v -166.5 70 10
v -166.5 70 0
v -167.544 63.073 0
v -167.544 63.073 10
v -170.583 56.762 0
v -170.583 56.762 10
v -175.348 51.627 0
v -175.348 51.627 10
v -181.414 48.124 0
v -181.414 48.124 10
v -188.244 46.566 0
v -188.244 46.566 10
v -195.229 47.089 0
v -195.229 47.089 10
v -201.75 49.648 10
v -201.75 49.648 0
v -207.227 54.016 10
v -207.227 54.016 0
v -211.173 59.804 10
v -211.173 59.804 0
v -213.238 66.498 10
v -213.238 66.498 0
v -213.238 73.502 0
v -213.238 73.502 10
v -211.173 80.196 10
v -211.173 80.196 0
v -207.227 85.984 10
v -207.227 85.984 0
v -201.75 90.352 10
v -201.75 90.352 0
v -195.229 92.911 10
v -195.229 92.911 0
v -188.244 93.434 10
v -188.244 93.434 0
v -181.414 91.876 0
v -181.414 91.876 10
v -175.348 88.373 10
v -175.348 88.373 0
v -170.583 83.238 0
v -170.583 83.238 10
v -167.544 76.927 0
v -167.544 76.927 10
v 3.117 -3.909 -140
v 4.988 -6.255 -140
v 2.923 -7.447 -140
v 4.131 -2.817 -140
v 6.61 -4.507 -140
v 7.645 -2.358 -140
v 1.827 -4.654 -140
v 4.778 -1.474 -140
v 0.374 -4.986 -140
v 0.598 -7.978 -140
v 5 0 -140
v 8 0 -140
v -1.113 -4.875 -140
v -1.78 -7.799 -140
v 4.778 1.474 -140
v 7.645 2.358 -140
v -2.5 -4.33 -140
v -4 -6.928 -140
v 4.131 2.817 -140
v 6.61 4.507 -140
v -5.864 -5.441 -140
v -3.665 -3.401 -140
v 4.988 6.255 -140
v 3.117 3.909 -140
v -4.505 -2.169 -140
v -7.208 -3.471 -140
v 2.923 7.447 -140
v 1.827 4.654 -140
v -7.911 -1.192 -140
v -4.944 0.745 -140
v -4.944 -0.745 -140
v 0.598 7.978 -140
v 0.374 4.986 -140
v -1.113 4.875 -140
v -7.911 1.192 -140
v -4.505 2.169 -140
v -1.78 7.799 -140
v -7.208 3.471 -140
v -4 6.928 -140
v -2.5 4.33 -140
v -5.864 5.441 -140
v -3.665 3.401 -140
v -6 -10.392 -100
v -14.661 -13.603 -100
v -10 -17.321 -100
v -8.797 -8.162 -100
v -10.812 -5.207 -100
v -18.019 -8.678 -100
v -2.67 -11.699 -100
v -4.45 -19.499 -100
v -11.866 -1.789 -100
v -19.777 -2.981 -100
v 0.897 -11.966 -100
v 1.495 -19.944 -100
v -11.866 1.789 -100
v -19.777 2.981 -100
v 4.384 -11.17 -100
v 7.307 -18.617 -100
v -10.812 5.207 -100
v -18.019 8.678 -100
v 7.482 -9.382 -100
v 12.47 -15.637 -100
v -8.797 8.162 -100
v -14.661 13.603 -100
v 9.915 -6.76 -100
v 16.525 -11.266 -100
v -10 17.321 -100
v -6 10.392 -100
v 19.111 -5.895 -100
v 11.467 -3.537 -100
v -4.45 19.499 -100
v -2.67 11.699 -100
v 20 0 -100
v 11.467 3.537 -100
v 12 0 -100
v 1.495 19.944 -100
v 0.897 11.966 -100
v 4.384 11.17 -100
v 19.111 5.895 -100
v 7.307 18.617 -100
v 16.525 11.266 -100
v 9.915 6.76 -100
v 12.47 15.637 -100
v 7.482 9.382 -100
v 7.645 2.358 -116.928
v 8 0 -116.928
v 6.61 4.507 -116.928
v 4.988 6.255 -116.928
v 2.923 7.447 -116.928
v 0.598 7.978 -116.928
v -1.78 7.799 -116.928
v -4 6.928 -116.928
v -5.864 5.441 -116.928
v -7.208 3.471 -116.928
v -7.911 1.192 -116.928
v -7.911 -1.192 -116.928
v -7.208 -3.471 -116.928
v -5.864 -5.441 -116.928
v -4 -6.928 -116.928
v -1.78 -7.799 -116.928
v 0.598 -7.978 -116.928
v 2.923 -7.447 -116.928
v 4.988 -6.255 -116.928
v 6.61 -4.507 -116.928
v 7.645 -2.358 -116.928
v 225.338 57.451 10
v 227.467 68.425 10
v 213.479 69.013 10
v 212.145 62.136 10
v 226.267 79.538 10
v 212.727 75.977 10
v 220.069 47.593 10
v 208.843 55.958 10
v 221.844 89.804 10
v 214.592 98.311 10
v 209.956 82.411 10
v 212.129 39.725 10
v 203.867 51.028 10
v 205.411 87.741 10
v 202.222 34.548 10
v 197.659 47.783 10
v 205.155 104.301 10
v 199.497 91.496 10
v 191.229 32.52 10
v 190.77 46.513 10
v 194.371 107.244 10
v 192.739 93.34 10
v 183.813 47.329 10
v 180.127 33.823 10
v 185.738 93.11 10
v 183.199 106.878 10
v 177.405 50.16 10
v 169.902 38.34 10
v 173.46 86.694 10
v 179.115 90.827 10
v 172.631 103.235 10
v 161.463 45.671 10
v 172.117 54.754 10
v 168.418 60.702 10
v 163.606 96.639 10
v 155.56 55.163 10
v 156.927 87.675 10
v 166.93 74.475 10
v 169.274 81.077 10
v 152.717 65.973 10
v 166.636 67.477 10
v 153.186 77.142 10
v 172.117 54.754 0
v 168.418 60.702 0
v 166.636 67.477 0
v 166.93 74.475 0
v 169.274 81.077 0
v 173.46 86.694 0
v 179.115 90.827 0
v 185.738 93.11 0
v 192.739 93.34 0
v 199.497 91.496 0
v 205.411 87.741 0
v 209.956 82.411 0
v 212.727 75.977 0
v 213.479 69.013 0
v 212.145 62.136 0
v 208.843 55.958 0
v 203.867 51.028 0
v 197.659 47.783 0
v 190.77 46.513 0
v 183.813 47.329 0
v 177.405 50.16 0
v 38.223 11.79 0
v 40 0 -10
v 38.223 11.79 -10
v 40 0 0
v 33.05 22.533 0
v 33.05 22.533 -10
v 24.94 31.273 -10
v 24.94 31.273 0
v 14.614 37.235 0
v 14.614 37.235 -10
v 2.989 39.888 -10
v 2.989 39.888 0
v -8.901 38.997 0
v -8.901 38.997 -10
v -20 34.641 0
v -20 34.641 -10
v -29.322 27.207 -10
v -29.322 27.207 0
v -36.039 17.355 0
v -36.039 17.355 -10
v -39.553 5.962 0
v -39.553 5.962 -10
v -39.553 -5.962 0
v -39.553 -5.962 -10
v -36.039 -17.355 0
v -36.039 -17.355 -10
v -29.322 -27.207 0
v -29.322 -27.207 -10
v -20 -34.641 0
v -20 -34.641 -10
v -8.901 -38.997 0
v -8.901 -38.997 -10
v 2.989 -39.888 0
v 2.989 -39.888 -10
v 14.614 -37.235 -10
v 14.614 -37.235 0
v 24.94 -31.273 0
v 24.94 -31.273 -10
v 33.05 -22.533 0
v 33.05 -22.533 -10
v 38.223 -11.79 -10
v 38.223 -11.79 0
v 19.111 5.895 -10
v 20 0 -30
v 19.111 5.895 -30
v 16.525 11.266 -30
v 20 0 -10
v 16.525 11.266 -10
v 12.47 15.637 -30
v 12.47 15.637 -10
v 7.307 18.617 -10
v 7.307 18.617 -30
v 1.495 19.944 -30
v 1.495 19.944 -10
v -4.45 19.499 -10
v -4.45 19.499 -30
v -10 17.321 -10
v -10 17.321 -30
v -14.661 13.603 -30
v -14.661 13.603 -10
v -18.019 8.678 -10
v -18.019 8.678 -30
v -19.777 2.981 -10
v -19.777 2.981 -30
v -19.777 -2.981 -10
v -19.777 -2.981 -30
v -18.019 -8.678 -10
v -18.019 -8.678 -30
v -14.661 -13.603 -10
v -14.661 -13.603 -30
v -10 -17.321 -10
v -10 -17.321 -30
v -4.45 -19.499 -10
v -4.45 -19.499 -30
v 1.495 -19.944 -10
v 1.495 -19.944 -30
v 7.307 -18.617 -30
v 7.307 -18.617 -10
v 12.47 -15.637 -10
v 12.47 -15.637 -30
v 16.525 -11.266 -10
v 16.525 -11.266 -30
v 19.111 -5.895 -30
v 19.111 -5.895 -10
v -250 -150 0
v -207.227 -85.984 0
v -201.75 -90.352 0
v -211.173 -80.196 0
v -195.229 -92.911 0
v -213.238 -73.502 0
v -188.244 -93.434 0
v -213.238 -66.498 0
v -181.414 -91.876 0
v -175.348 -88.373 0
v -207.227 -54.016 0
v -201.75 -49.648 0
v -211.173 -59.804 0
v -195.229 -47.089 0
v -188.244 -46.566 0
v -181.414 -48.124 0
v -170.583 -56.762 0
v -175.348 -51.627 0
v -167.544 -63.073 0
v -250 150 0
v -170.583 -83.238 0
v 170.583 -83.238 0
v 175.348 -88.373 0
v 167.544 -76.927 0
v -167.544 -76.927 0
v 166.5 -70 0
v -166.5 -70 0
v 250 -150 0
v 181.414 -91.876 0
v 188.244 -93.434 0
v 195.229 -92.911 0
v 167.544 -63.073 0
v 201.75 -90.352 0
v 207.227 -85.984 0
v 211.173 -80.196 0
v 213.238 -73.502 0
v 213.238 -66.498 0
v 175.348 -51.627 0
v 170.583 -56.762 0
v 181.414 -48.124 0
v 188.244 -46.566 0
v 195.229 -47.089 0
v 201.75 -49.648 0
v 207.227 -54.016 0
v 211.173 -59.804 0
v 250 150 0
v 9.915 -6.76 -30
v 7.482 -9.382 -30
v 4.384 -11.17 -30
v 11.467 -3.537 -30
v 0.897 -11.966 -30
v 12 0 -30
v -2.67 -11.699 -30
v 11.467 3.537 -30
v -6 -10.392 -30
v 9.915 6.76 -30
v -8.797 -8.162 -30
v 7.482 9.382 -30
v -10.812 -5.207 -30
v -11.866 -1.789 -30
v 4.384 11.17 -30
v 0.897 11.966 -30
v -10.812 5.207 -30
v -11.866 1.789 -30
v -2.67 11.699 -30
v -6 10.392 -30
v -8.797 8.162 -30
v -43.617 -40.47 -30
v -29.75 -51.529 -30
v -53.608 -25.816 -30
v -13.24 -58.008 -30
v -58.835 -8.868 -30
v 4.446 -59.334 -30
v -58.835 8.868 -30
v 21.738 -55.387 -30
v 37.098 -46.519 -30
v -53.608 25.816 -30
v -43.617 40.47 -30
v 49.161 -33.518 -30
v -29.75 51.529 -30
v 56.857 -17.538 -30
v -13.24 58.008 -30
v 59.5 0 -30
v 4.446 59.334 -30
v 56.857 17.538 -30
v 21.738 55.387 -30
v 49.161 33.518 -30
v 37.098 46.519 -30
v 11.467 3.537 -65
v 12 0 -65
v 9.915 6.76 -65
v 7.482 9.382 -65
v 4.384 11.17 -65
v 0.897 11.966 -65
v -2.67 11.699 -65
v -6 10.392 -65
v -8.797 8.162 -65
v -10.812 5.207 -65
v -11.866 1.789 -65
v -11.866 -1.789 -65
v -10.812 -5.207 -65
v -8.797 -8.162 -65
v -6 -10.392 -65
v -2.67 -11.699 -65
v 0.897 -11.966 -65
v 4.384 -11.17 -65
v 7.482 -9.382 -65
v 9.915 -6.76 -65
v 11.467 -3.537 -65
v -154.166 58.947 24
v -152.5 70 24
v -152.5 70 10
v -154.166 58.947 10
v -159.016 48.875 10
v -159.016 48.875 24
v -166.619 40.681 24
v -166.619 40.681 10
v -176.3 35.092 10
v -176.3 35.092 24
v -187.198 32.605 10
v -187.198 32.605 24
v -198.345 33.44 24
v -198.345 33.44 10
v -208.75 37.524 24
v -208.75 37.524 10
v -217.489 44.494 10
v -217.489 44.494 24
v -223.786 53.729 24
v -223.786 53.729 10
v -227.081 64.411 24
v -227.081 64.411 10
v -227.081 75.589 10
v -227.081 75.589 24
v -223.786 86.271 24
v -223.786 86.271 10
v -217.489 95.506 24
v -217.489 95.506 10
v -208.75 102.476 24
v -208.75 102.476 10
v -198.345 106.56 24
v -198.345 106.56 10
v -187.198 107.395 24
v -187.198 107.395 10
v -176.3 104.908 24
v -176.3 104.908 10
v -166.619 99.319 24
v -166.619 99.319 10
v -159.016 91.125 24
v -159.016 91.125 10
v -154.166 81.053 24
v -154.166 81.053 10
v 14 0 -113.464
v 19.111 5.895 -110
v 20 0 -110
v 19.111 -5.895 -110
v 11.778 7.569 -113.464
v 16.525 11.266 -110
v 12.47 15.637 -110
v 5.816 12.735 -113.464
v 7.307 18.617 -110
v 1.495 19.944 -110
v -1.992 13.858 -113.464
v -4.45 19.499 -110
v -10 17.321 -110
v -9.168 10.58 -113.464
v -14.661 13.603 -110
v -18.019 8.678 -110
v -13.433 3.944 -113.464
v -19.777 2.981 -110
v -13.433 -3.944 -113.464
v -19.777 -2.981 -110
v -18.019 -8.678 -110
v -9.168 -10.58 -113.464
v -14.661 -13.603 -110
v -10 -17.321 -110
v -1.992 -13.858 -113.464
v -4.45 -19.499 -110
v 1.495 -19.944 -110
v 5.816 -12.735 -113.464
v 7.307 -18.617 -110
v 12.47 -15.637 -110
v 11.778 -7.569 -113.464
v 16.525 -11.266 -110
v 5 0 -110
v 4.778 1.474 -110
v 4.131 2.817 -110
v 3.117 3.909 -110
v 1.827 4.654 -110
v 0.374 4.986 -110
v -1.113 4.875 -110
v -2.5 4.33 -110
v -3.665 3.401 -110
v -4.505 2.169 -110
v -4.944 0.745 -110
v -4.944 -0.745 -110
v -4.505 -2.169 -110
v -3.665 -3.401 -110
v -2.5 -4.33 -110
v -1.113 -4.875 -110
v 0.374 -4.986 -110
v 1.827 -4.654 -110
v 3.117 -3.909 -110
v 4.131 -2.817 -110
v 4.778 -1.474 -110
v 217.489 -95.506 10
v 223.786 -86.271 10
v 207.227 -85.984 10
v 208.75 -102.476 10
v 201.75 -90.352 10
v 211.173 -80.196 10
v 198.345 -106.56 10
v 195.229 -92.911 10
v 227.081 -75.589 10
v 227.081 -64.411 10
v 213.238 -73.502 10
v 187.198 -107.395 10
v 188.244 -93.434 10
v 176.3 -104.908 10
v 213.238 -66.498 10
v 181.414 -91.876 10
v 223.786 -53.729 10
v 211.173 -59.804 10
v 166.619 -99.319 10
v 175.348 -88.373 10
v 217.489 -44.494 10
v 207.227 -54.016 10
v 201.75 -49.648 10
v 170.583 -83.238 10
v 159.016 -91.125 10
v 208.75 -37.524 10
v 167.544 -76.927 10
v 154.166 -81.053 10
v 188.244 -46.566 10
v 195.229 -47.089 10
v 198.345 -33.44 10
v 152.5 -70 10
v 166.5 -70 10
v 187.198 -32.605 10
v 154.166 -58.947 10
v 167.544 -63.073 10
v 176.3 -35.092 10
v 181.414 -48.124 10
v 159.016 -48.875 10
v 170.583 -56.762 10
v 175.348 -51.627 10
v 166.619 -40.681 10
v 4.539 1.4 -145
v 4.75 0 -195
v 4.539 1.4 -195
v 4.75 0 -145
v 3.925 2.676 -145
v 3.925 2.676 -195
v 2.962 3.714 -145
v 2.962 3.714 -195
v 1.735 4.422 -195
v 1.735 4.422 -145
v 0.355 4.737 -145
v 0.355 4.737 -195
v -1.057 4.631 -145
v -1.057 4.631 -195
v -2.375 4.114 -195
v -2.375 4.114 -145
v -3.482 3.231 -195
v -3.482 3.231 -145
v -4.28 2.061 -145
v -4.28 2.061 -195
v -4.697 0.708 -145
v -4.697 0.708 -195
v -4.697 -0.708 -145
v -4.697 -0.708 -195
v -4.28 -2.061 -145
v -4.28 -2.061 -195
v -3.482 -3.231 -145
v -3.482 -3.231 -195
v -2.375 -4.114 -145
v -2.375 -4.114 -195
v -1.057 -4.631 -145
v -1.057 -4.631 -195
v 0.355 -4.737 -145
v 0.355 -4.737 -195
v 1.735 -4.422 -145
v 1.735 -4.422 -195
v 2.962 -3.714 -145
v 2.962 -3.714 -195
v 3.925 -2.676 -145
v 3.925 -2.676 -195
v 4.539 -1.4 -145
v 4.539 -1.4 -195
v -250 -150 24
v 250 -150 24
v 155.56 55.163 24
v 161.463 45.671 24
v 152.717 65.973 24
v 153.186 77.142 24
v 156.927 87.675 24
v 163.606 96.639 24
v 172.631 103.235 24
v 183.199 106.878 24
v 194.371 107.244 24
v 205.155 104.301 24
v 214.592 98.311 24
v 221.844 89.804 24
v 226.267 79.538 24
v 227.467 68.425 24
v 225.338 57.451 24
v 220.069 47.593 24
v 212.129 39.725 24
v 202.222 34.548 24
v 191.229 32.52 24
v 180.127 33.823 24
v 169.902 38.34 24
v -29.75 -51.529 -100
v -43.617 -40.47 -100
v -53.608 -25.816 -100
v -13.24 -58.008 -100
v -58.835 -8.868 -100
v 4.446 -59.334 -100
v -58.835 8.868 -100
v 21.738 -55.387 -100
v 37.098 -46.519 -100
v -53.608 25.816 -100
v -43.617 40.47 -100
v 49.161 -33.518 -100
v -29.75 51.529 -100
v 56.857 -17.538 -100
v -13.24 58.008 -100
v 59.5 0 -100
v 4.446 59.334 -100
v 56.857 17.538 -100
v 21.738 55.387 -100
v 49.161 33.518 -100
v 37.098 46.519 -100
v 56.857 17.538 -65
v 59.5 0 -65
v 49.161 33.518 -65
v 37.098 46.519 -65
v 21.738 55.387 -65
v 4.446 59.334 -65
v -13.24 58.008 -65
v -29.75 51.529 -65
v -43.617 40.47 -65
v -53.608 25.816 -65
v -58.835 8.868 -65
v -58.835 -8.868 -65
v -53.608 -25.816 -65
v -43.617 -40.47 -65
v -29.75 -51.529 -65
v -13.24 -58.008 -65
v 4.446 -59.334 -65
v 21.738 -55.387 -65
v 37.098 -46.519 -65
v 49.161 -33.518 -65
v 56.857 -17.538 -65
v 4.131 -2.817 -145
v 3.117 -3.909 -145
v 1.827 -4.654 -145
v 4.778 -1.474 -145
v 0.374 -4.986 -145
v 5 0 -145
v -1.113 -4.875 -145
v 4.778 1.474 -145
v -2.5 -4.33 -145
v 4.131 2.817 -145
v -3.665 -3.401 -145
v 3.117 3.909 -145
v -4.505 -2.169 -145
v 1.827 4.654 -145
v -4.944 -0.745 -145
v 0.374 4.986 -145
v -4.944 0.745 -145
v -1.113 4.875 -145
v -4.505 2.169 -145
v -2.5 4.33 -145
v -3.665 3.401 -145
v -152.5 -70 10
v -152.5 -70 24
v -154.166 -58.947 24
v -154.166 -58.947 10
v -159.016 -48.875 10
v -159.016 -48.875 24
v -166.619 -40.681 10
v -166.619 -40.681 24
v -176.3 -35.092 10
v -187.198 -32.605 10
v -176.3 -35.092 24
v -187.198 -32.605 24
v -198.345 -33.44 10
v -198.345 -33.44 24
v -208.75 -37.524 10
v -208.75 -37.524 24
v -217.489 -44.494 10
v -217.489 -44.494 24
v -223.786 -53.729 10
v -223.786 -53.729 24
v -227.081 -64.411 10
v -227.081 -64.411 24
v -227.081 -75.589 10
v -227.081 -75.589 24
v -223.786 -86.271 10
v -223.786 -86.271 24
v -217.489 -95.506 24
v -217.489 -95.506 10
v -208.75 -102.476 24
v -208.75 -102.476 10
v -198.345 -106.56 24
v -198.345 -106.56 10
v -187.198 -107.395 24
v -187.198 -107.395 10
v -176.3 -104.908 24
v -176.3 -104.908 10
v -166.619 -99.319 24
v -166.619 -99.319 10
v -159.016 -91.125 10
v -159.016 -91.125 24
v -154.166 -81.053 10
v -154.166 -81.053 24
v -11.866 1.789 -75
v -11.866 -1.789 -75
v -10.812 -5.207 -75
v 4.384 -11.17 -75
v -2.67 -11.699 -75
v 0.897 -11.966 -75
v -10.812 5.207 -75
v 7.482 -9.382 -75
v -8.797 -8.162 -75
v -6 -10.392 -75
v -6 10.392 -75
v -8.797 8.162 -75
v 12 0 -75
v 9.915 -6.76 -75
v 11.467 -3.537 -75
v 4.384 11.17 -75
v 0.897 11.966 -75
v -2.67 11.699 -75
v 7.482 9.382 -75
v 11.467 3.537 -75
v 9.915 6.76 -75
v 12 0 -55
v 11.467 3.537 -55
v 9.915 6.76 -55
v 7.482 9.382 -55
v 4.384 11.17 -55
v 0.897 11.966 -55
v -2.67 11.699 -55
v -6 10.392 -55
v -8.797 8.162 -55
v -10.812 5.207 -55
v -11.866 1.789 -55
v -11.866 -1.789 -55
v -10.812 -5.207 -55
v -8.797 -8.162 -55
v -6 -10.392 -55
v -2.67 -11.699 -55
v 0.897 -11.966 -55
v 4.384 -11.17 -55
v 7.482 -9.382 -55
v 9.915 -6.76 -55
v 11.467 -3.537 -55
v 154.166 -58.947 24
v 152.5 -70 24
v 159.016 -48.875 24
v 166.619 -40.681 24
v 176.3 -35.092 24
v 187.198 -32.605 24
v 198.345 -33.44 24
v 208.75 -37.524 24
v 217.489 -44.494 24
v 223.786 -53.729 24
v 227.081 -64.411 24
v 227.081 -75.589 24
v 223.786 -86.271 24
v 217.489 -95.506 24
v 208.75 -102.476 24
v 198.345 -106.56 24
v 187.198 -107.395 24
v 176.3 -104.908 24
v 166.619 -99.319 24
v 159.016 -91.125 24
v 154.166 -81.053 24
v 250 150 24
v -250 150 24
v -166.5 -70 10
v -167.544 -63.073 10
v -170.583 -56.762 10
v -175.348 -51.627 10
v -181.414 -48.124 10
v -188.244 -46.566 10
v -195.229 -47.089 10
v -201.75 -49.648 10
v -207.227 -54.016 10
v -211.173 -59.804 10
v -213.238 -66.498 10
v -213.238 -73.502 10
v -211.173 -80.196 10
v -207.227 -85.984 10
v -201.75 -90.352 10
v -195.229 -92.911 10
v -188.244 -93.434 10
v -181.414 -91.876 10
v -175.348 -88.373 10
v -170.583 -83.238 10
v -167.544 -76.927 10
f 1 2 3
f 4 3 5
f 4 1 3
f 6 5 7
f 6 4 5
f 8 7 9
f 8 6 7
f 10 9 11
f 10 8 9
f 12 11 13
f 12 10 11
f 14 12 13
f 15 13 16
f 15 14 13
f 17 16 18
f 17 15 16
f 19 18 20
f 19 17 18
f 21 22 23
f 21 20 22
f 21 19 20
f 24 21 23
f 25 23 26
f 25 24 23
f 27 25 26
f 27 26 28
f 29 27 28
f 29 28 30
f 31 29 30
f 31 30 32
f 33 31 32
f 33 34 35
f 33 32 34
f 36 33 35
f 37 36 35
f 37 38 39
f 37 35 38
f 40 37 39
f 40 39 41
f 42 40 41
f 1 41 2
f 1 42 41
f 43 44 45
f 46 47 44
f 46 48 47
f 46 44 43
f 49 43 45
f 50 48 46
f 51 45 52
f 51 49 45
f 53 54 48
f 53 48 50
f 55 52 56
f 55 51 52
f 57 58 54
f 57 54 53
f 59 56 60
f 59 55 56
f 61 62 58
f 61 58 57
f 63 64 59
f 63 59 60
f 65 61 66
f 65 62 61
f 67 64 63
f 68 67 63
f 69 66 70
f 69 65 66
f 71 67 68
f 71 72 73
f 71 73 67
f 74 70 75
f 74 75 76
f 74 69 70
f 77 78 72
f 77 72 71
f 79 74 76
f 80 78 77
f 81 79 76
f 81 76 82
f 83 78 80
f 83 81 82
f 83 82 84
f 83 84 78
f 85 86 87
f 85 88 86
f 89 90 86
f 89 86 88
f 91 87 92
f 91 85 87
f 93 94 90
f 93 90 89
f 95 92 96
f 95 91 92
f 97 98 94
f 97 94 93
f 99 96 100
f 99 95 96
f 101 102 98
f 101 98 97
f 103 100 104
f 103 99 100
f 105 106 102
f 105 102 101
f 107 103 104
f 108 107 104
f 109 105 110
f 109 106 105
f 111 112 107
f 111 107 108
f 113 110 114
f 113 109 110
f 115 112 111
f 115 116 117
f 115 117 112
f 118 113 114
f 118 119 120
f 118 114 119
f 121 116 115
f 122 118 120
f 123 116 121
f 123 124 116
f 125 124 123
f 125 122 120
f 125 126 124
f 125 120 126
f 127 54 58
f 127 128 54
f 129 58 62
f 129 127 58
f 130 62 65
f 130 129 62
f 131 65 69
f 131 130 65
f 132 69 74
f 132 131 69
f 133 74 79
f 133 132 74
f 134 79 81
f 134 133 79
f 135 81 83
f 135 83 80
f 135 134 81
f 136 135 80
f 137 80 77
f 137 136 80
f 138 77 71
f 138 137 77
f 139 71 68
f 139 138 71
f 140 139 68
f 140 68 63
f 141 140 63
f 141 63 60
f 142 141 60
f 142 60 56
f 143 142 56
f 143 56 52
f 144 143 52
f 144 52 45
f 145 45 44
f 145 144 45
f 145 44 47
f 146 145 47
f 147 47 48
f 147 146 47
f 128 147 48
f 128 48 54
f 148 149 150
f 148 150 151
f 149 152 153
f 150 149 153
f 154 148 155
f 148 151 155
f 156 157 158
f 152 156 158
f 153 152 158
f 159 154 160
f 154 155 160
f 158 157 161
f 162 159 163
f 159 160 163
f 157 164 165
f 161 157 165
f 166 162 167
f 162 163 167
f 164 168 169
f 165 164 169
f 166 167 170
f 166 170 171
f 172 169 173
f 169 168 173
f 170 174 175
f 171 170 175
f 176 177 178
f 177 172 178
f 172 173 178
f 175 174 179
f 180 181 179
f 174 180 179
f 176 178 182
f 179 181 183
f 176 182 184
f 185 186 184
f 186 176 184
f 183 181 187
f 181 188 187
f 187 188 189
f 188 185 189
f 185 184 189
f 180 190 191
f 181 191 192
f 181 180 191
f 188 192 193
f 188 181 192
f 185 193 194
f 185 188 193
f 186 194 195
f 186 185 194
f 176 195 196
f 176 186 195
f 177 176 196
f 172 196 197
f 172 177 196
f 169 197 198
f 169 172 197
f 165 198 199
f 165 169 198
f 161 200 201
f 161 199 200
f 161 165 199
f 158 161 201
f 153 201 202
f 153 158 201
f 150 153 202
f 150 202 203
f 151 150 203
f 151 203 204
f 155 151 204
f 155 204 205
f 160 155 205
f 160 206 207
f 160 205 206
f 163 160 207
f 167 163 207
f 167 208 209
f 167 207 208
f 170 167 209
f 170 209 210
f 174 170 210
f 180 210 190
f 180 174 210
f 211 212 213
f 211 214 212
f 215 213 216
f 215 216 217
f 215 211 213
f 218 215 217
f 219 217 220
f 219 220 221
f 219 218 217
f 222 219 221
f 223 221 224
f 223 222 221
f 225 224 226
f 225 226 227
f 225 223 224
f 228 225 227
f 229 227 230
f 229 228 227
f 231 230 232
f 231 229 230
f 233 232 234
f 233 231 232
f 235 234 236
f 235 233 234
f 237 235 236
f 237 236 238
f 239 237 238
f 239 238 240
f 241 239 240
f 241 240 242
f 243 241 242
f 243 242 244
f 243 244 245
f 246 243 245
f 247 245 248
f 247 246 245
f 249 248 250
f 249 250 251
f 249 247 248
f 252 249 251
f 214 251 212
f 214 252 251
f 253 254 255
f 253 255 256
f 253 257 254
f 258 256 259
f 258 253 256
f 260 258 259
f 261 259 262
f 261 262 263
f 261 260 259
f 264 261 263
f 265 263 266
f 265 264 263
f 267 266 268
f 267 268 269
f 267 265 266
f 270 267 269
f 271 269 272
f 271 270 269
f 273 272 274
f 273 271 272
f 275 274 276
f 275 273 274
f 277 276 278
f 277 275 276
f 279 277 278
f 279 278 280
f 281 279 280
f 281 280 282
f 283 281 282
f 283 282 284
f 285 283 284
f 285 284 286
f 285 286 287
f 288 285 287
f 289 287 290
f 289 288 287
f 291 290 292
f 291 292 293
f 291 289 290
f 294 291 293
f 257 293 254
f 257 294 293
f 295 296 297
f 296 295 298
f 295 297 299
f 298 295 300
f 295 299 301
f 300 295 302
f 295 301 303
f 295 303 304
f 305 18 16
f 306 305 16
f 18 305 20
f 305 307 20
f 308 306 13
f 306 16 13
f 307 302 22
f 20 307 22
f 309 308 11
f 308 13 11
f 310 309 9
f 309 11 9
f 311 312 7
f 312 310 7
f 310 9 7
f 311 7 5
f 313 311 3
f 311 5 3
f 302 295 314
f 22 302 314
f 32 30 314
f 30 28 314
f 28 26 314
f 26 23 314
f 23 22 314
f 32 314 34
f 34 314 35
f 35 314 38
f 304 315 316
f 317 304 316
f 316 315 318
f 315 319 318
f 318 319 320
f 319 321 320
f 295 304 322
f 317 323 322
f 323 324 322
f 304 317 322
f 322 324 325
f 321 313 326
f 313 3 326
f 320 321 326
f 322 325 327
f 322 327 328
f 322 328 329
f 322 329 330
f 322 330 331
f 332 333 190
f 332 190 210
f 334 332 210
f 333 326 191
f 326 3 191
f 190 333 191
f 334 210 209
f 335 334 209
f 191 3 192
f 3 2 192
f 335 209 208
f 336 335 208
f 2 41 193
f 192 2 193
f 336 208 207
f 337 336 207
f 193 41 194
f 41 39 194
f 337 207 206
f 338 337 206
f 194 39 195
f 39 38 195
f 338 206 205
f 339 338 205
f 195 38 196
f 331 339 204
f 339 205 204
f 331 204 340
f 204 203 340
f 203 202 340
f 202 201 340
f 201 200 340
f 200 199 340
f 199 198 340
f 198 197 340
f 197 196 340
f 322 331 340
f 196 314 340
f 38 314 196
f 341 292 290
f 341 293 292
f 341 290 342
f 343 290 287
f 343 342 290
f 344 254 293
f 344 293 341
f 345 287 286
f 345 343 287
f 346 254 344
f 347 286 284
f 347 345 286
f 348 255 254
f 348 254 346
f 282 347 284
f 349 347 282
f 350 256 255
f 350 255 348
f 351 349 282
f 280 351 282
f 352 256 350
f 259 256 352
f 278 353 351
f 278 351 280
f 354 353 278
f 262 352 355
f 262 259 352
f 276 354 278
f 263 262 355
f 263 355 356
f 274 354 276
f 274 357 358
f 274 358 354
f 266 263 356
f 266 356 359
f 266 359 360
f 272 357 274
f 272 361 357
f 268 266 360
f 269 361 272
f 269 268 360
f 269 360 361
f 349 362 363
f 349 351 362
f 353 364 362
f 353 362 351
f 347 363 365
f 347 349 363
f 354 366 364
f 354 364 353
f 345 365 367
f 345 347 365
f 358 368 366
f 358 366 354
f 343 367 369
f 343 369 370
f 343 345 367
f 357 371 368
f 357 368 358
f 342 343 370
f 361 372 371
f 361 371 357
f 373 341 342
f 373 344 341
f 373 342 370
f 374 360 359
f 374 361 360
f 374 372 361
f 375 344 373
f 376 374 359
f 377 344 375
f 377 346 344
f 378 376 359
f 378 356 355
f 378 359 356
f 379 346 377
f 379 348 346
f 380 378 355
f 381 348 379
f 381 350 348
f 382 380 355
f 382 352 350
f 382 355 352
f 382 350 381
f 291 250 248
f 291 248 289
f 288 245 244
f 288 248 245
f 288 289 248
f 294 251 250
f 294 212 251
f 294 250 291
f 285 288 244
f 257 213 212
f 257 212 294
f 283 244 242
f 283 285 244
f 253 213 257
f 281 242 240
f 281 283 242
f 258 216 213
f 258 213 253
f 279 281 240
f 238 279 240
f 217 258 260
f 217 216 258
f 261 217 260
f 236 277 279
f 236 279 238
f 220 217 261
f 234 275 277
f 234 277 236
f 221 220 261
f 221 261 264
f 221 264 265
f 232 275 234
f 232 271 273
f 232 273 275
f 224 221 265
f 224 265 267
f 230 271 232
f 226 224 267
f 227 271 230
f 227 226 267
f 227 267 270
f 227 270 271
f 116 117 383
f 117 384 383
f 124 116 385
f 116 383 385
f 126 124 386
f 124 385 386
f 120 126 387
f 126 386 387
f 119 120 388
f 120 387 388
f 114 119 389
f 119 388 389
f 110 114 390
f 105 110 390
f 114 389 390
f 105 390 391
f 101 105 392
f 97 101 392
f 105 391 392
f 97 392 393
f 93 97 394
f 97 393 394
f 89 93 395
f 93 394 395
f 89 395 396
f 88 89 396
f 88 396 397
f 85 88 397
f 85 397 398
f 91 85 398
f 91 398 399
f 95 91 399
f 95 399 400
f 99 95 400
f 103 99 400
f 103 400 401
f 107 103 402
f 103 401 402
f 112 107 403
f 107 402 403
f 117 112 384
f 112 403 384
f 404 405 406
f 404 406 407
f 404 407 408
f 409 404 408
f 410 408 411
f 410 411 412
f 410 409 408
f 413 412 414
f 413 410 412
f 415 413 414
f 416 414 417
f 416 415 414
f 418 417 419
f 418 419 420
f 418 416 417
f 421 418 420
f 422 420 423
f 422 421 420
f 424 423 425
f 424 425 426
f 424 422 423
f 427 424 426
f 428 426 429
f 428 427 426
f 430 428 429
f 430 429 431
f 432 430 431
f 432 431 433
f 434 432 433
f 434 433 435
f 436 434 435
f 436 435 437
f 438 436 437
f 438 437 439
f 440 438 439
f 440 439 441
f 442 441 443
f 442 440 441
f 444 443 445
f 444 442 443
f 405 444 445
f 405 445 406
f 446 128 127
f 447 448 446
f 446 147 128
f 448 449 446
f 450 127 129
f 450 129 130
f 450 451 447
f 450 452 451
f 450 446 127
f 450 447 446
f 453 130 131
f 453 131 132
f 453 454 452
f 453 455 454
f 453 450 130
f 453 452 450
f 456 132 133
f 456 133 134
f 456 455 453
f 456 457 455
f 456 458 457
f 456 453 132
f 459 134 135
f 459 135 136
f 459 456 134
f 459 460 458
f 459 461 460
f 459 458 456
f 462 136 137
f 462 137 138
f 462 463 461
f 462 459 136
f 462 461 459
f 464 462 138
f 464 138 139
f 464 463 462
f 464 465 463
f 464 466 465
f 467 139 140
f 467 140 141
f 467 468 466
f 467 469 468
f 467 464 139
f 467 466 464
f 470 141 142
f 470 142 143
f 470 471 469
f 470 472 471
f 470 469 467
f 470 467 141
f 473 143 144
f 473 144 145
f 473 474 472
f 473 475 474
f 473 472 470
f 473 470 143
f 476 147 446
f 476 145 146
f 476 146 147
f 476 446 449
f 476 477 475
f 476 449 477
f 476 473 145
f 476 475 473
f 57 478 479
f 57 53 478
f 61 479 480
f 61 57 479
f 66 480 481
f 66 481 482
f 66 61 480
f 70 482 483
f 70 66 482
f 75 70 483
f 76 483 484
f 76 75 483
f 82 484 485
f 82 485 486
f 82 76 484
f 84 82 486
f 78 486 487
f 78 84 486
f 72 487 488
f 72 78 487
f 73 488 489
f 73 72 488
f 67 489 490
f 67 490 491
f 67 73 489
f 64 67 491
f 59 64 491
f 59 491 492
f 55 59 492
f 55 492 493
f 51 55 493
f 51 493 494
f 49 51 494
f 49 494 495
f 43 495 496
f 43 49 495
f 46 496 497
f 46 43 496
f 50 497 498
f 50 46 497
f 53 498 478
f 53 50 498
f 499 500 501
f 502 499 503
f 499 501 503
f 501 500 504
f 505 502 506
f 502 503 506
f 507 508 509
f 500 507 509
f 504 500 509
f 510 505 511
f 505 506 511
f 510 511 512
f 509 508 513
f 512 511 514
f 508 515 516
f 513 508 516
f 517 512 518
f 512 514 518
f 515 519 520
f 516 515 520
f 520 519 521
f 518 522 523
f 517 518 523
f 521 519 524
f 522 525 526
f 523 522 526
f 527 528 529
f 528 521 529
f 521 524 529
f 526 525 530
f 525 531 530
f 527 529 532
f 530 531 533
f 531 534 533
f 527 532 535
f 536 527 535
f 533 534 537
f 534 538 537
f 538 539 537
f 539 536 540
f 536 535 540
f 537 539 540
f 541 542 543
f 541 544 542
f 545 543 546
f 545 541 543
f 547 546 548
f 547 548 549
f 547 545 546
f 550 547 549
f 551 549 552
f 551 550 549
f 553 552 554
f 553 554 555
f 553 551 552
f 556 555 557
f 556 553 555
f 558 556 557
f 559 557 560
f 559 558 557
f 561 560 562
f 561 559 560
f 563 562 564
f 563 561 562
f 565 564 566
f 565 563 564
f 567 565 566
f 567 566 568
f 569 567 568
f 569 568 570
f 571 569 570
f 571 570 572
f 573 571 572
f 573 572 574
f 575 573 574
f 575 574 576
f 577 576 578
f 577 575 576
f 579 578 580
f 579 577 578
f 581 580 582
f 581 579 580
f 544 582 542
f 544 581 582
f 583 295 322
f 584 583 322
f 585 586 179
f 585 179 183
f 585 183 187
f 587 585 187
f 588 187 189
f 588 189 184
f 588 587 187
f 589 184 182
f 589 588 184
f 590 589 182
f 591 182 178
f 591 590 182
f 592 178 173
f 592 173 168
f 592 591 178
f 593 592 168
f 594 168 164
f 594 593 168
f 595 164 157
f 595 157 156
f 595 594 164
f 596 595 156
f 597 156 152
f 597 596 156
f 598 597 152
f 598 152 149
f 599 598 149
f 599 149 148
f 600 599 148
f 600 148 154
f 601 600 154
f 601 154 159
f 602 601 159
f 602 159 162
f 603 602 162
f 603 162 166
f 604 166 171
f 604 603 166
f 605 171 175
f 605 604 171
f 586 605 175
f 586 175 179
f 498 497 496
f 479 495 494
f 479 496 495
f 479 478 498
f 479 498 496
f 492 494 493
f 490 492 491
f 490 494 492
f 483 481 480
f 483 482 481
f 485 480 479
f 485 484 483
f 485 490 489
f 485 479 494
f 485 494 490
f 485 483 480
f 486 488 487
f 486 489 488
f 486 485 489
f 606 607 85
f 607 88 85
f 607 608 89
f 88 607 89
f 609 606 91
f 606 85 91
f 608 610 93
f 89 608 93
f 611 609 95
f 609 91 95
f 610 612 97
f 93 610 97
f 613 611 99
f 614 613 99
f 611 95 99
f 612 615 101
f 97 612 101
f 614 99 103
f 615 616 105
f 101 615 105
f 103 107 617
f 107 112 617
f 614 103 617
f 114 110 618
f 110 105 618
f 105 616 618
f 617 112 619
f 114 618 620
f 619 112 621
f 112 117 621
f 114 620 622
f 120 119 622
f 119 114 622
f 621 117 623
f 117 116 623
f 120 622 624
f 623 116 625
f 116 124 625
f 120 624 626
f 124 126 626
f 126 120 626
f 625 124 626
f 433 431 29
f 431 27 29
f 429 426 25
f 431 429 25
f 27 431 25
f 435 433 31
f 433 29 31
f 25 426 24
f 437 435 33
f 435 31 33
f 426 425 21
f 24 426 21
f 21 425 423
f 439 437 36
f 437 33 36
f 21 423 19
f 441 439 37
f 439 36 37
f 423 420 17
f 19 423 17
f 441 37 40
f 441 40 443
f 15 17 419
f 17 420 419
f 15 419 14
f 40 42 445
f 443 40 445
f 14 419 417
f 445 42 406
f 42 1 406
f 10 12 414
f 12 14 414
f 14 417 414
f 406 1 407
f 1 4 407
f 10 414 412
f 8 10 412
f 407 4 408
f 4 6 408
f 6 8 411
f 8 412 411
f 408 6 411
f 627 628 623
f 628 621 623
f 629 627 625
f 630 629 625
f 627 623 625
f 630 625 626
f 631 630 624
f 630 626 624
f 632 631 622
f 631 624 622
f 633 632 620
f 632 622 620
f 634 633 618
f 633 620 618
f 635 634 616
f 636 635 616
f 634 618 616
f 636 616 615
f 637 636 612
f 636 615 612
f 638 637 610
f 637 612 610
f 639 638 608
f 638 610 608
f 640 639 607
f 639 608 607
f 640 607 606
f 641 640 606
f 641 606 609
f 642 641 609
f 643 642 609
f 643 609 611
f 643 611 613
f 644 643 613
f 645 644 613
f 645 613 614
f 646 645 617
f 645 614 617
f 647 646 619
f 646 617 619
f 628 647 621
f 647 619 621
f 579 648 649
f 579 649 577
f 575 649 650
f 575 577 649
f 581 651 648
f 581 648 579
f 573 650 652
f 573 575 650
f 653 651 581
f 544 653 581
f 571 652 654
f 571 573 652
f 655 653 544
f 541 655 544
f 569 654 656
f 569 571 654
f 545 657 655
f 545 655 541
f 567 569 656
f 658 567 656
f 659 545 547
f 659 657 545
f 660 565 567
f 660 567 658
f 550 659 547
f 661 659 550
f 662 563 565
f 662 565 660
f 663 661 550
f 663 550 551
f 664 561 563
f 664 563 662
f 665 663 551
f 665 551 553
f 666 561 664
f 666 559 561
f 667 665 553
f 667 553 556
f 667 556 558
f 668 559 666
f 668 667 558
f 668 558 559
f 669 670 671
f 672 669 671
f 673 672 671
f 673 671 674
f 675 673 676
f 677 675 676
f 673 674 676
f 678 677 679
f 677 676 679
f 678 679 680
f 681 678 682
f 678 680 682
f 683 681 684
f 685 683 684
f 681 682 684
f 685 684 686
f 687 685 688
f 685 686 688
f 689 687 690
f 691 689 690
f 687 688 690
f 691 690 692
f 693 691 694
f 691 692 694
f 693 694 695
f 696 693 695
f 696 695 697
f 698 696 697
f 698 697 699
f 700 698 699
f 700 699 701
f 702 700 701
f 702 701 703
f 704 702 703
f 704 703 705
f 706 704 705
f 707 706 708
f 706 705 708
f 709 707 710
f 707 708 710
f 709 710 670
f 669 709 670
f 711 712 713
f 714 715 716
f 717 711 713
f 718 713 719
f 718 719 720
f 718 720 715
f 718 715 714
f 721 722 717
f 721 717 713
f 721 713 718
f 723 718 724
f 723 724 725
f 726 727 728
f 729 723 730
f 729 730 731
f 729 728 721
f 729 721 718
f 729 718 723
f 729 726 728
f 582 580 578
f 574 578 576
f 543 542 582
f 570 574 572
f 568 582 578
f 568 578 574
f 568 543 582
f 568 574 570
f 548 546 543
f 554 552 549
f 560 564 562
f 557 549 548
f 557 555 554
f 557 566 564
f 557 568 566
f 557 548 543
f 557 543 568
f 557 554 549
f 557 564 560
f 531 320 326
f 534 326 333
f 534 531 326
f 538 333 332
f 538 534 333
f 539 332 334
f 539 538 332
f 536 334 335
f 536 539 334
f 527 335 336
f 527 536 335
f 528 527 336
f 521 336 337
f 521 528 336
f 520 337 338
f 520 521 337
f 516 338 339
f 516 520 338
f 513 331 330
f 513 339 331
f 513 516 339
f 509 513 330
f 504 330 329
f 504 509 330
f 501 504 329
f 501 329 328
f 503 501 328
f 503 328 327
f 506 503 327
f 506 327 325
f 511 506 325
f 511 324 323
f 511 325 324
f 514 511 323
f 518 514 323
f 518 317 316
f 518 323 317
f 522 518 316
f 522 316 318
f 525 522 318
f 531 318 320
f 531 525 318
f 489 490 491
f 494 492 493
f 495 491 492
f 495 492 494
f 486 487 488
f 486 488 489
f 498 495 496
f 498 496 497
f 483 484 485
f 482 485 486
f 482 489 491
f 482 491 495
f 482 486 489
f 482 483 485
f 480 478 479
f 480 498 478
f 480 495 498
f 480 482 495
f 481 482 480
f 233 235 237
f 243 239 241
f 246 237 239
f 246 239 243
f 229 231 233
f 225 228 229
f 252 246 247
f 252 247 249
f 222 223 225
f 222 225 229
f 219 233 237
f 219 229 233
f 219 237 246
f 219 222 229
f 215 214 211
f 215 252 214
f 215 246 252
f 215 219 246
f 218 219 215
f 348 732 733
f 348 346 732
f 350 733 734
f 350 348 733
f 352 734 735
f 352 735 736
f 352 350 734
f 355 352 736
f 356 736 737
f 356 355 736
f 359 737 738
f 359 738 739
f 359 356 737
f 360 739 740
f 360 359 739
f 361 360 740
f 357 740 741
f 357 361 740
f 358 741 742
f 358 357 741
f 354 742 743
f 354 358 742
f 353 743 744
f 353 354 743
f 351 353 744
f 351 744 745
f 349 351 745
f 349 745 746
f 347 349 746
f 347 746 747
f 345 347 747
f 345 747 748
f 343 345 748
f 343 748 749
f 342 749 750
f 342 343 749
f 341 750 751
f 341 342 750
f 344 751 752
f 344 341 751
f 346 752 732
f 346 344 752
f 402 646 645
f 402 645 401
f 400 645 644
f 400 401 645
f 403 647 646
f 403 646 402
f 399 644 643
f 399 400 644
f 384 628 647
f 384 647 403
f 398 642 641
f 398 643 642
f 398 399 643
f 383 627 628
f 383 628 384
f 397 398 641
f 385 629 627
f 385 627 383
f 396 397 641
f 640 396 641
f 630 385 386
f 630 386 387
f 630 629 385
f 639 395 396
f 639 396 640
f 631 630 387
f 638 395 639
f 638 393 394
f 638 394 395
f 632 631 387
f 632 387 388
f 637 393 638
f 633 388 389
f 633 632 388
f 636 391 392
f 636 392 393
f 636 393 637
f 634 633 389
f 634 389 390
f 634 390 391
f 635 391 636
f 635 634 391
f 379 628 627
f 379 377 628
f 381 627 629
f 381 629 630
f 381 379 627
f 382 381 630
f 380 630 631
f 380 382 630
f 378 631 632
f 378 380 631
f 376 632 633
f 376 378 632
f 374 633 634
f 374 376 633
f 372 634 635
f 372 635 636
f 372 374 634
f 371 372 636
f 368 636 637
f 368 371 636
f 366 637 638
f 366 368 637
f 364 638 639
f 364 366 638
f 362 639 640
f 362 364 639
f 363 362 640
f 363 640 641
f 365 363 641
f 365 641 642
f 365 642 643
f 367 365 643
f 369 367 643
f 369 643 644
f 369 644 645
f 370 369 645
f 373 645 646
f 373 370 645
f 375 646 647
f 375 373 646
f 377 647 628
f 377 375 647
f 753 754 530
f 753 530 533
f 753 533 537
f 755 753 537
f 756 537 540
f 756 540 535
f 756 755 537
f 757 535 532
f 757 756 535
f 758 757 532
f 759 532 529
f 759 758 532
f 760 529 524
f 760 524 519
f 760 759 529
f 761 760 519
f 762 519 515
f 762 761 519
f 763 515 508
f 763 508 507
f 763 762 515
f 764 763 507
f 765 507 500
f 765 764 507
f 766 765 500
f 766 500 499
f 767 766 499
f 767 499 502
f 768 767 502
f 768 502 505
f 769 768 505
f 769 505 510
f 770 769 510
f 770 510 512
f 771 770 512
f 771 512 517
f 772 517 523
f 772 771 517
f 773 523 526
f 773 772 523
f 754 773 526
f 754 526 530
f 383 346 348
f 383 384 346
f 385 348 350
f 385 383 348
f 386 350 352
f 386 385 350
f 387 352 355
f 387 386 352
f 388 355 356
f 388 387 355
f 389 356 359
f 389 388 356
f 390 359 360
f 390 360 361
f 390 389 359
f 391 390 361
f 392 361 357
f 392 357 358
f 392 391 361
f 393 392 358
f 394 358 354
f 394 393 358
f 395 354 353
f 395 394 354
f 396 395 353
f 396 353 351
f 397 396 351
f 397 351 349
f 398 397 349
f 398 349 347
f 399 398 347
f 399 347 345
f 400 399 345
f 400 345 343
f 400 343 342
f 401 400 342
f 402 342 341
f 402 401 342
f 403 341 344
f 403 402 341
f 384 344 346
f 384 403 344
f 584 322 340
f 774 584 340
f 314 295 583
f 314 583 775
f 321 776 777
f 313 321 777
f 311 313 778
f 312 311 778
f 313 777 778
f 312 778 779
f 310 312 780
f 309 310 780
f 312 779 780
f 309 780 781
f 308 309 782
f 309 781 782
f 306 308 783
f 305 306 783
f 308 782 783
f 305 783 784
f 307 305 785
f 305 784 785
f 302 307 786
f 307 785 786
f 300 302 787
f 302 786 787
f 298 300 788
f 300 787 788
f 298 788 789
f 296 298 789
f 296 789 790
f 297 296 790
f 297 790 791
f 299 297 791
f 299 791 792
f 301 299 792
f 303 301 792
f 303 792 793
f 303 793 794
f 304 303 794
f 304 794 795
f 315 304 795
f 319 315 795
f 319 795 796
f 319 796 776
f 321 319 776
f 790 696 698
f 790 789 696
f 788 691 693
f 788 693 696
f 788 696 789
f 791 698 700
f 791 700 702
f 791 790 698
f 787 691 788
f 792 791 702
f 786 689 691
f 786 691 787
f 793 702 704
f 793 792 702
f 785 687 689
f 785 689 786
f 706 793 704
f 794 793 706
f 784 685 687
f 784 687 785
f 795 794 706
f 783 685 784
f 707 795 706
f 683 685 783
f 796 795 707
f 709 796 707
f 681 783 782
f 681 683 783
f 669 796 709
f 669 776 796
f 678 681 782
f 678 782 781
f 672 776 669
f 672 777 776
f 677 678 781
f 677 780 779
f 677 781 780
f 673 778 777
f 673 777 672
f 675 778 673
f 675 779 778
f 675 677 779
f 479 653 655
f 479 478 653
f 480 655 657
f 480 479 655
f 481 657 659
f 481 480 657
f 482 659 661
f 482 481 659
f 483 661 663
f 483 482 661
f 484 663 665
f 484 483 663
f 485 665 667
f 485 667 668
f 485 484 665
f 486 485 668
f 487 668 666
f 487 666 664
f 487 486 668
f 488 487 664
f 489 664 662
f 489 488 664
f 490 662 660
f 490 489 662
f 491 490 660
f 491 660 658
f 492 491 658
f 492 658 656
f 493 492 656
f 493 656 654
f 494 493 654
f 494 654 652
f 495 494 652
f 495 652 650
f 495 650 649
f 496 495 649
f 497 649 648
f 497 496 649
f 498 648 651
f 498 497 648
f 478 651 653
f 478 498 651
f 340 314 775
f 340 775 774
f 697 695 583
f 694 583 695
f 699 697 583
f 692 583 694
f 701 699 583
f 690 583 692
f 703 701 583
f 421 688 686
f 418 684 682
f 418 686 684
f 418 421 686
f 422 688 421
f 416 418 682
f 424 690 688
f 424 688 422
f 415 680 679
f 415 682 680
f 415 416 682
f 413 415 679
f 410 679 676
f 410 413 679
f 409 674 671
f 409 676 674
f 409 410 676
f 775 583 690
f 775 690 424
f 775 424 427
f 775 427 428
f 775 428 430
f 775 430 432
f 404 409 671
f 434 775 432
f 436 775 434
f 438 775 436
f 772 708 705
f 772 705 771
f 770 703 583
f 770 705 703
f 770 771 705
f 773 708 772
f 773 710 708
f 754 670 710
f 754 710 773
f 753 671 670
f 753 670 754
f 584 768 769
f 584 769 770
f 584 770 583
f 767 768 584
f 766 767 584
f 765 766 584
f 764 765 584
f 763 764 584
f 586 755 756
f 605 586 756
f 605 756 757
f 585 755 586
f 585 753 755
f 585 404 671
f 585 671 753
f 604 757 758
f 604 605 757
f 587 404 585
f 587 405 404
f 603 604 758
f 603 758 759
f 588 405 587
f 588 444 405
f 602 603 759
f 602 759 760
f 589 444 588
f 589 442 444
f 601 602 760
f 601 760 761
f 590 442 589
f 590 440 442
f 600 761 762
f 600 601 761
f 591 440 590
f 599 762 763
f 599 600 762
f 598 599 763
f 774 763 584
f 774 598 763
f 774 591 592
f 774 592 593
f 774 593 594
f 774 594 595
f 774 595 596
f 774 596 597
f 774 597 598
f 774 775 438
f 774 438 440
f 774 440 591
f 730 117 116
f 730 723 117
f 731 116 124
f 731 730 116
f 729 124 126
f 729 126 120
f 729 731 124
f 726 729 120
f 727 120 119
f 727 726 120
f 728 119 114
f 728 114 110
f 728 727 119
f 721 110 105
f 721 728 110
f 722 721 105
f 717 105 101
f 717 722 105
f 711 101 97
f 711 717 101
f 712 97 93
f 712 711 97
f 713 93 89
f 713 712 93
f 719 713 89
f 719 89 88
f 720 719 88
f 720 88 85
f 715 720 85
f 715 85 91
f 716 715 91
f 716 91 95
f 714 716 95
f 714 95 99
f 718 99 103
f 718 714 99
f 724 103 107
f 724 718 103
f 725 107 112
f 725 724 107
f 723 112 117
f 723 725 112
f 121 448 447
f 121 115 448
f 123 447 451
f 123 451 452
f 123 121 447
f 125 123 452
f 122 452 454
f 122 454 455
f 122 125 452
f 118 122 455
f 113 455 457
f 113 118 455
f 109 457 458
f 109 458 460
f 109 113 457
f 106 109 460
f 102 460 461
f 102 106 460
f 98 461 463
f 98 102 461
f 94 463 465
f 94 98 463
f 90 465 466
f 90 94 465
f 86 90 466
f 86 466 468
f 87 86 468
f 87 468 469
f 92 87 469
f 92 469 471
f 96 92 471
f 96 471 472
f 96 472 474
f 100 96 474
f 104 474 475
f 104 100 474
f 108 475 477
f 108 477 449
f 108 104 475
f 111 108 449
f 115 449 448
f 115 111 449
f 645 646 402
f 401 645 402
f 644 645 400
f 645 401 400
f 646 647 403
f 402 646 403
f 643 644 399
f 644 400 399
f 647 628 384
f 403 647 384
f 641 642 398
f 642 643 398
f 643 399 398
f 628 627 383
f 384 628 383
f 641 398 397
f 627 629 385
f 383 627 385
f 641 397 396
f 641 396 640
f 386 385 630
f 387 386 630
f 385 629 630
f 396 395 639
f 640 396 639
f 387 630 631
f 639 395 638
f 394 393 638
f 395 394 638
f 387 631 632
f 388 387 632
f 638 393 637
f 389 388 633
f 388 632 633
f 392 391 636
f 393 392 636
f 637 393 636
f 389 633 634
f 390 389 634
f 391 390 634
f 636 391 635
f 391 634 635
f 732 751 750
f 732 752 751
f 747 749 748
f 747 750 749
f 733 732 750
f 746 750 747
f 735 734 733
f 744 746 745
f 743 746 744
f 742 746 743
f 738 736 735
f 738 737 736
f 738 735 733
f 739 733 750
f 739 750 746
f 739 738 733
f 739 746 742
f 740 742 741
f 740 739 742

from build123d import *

# Parameters (mm, degrees)
F0_W     = 500
F0_H     = 300
F1_DEPTH = 24
F2_R     = 23.5
F3_DEPTH = 24.001
F2_R_2   = 37.5
F4_DEPTH = 14


# Not quite as in the source:
# - a pattern or mirror of a feature is missing from the dataset's text; its kind, count and spacing are read off the source's solid
# - a feature names something its author has since deleted; it is built from what else it names


with BuildPart() as f1:
    # F0 (on Top) → F1 (new body)
    with BuildSketch(Plane.XY):
        Rectangle(F0_W, F0_H)
    extrude(amount=F1_DEPTH)

    # F2 (on face) → F3 (cut, through all)
    with BuildSketch(Plane.XY.offset(24)):
        with Locations((-190, -70)):
            Circle(F2_R)
    f3 = extrude(amount=-F3_DEPTH, mode=Mode.SUBTRACT)

    # F3_copies: F3 across plane
    add(f3.mirror(Plane(origin=(0, 0, 0), x_dir=(-0.3457053588, 0.9383431168, 0), z_dir=(0.9383431168, 0.3457053588, 0))), mode=Mode.SUBTRACT)

    # F3_copies1: F3 across plane
    add(f3.mirror(Plane(origin=(0, 0, 0), x_dir=(0, 0, 1), z_dir=(1, 0, 0))), mode=Mode.SUBTRACT)

    # F3_copies2: F3 across plane
    add(f3.mirror(Plane.ZX), mode=Mode.SUBTRACT)

    # F2 (on face) → F4 (cut)
    with BuildSketch(Plane.XY.offset(24)):
        with Locations((-190, -70)):
            Circle(F2_R_2)
        with Locations((-190, -70)):
            Circle(F2_R, mode=Mode.SUBTRACT)
    f4 = extrude(amount=-F4_DEPTH, mode=Mode.SUBTRACT)

    # F4_copies: F4 across plane
    add(f4.mirror(Plane(origin=(0, 0, 0), x_dir=(0, 0, 1), z_dir=(1, 0, 0))), mode=Mode.SUBTRACT)

    # F4_copies1: F4 across plane
    add(f4.mirror(Plane.ZX), mode=Mode.SUBTRACT)

    # F4_copies2: F4 across plane
    add(f4.mirror(Plane(origin=(0, 0, 0), x_dir=(-0.3457053588, 0.9383431168, 0), z_dir=(0.9383431168, 0.3457053588, 0))), mode=Mode.SUBTRACT)


with BuildPart() as f6:
    # F5 (on Front) → F6 (revolve)
    with BuildSketch(Plane.XZ):
        Polygon((0, 0), (0, -55), (12, -55), (12, -30), (20, -30), (20, -10), (40, -10), (40, 0), align=None)
    revolve(axis=Axis((0, 0, -27.5), (0, 0, 1)))


with BuildPart() as f7:
    # F5 (on Front) → F7 (revolve)
    with BuildSketch(Plane.XZ):
        Polygon((12, -30), (12, -55), (12, -65), (59.5, -65), (59.5, -30), (20, -30), align=None)
    revolve(axis=Axis((0, 0, -27.5), (0, 0, 1)))


with BuildPart() as f8_1:
    # F8: instance of F7
    add(f7.part.mirror(Plane(origin=(0, 0, -65), x_dir=(1, 0, 0), z_dir=(0, 0, -1))))


with BuildPart() as f9:
    # F5 (on Front) → F9 (revolve)
    with BuildSketch(Plane.XZ):
        Polygon((12, -75), (0, -75), (0, -110), (5, -110), (5, -140), (8, -140), (8, -116.9282032303), (8, -110), (20, -110), (20, -100), (12, -100), align=None)
        Polygon((8, -116.9282032303), (20, -110), (8, -110), align=None)
    revolve(axis=Axis((0, 0, -92.5), (0, 0, 1)))


with BuildPart() as f10:
    # F5 (on Front) → F10 (revolve)
    with BuildSketch(Plane.XZ):
        Polygon((5, -110), (0, -110), (0, -195), (4.75, -195), (4.75, -145), (5, -145), (5, -140), align=None)
    revolve(axis=Axis((0, 0, -152.5), (0, 0, 1)))


solid = Compound([f1.part, f6.part, f7.part, f8_1.part, f9.part, f10.part])
